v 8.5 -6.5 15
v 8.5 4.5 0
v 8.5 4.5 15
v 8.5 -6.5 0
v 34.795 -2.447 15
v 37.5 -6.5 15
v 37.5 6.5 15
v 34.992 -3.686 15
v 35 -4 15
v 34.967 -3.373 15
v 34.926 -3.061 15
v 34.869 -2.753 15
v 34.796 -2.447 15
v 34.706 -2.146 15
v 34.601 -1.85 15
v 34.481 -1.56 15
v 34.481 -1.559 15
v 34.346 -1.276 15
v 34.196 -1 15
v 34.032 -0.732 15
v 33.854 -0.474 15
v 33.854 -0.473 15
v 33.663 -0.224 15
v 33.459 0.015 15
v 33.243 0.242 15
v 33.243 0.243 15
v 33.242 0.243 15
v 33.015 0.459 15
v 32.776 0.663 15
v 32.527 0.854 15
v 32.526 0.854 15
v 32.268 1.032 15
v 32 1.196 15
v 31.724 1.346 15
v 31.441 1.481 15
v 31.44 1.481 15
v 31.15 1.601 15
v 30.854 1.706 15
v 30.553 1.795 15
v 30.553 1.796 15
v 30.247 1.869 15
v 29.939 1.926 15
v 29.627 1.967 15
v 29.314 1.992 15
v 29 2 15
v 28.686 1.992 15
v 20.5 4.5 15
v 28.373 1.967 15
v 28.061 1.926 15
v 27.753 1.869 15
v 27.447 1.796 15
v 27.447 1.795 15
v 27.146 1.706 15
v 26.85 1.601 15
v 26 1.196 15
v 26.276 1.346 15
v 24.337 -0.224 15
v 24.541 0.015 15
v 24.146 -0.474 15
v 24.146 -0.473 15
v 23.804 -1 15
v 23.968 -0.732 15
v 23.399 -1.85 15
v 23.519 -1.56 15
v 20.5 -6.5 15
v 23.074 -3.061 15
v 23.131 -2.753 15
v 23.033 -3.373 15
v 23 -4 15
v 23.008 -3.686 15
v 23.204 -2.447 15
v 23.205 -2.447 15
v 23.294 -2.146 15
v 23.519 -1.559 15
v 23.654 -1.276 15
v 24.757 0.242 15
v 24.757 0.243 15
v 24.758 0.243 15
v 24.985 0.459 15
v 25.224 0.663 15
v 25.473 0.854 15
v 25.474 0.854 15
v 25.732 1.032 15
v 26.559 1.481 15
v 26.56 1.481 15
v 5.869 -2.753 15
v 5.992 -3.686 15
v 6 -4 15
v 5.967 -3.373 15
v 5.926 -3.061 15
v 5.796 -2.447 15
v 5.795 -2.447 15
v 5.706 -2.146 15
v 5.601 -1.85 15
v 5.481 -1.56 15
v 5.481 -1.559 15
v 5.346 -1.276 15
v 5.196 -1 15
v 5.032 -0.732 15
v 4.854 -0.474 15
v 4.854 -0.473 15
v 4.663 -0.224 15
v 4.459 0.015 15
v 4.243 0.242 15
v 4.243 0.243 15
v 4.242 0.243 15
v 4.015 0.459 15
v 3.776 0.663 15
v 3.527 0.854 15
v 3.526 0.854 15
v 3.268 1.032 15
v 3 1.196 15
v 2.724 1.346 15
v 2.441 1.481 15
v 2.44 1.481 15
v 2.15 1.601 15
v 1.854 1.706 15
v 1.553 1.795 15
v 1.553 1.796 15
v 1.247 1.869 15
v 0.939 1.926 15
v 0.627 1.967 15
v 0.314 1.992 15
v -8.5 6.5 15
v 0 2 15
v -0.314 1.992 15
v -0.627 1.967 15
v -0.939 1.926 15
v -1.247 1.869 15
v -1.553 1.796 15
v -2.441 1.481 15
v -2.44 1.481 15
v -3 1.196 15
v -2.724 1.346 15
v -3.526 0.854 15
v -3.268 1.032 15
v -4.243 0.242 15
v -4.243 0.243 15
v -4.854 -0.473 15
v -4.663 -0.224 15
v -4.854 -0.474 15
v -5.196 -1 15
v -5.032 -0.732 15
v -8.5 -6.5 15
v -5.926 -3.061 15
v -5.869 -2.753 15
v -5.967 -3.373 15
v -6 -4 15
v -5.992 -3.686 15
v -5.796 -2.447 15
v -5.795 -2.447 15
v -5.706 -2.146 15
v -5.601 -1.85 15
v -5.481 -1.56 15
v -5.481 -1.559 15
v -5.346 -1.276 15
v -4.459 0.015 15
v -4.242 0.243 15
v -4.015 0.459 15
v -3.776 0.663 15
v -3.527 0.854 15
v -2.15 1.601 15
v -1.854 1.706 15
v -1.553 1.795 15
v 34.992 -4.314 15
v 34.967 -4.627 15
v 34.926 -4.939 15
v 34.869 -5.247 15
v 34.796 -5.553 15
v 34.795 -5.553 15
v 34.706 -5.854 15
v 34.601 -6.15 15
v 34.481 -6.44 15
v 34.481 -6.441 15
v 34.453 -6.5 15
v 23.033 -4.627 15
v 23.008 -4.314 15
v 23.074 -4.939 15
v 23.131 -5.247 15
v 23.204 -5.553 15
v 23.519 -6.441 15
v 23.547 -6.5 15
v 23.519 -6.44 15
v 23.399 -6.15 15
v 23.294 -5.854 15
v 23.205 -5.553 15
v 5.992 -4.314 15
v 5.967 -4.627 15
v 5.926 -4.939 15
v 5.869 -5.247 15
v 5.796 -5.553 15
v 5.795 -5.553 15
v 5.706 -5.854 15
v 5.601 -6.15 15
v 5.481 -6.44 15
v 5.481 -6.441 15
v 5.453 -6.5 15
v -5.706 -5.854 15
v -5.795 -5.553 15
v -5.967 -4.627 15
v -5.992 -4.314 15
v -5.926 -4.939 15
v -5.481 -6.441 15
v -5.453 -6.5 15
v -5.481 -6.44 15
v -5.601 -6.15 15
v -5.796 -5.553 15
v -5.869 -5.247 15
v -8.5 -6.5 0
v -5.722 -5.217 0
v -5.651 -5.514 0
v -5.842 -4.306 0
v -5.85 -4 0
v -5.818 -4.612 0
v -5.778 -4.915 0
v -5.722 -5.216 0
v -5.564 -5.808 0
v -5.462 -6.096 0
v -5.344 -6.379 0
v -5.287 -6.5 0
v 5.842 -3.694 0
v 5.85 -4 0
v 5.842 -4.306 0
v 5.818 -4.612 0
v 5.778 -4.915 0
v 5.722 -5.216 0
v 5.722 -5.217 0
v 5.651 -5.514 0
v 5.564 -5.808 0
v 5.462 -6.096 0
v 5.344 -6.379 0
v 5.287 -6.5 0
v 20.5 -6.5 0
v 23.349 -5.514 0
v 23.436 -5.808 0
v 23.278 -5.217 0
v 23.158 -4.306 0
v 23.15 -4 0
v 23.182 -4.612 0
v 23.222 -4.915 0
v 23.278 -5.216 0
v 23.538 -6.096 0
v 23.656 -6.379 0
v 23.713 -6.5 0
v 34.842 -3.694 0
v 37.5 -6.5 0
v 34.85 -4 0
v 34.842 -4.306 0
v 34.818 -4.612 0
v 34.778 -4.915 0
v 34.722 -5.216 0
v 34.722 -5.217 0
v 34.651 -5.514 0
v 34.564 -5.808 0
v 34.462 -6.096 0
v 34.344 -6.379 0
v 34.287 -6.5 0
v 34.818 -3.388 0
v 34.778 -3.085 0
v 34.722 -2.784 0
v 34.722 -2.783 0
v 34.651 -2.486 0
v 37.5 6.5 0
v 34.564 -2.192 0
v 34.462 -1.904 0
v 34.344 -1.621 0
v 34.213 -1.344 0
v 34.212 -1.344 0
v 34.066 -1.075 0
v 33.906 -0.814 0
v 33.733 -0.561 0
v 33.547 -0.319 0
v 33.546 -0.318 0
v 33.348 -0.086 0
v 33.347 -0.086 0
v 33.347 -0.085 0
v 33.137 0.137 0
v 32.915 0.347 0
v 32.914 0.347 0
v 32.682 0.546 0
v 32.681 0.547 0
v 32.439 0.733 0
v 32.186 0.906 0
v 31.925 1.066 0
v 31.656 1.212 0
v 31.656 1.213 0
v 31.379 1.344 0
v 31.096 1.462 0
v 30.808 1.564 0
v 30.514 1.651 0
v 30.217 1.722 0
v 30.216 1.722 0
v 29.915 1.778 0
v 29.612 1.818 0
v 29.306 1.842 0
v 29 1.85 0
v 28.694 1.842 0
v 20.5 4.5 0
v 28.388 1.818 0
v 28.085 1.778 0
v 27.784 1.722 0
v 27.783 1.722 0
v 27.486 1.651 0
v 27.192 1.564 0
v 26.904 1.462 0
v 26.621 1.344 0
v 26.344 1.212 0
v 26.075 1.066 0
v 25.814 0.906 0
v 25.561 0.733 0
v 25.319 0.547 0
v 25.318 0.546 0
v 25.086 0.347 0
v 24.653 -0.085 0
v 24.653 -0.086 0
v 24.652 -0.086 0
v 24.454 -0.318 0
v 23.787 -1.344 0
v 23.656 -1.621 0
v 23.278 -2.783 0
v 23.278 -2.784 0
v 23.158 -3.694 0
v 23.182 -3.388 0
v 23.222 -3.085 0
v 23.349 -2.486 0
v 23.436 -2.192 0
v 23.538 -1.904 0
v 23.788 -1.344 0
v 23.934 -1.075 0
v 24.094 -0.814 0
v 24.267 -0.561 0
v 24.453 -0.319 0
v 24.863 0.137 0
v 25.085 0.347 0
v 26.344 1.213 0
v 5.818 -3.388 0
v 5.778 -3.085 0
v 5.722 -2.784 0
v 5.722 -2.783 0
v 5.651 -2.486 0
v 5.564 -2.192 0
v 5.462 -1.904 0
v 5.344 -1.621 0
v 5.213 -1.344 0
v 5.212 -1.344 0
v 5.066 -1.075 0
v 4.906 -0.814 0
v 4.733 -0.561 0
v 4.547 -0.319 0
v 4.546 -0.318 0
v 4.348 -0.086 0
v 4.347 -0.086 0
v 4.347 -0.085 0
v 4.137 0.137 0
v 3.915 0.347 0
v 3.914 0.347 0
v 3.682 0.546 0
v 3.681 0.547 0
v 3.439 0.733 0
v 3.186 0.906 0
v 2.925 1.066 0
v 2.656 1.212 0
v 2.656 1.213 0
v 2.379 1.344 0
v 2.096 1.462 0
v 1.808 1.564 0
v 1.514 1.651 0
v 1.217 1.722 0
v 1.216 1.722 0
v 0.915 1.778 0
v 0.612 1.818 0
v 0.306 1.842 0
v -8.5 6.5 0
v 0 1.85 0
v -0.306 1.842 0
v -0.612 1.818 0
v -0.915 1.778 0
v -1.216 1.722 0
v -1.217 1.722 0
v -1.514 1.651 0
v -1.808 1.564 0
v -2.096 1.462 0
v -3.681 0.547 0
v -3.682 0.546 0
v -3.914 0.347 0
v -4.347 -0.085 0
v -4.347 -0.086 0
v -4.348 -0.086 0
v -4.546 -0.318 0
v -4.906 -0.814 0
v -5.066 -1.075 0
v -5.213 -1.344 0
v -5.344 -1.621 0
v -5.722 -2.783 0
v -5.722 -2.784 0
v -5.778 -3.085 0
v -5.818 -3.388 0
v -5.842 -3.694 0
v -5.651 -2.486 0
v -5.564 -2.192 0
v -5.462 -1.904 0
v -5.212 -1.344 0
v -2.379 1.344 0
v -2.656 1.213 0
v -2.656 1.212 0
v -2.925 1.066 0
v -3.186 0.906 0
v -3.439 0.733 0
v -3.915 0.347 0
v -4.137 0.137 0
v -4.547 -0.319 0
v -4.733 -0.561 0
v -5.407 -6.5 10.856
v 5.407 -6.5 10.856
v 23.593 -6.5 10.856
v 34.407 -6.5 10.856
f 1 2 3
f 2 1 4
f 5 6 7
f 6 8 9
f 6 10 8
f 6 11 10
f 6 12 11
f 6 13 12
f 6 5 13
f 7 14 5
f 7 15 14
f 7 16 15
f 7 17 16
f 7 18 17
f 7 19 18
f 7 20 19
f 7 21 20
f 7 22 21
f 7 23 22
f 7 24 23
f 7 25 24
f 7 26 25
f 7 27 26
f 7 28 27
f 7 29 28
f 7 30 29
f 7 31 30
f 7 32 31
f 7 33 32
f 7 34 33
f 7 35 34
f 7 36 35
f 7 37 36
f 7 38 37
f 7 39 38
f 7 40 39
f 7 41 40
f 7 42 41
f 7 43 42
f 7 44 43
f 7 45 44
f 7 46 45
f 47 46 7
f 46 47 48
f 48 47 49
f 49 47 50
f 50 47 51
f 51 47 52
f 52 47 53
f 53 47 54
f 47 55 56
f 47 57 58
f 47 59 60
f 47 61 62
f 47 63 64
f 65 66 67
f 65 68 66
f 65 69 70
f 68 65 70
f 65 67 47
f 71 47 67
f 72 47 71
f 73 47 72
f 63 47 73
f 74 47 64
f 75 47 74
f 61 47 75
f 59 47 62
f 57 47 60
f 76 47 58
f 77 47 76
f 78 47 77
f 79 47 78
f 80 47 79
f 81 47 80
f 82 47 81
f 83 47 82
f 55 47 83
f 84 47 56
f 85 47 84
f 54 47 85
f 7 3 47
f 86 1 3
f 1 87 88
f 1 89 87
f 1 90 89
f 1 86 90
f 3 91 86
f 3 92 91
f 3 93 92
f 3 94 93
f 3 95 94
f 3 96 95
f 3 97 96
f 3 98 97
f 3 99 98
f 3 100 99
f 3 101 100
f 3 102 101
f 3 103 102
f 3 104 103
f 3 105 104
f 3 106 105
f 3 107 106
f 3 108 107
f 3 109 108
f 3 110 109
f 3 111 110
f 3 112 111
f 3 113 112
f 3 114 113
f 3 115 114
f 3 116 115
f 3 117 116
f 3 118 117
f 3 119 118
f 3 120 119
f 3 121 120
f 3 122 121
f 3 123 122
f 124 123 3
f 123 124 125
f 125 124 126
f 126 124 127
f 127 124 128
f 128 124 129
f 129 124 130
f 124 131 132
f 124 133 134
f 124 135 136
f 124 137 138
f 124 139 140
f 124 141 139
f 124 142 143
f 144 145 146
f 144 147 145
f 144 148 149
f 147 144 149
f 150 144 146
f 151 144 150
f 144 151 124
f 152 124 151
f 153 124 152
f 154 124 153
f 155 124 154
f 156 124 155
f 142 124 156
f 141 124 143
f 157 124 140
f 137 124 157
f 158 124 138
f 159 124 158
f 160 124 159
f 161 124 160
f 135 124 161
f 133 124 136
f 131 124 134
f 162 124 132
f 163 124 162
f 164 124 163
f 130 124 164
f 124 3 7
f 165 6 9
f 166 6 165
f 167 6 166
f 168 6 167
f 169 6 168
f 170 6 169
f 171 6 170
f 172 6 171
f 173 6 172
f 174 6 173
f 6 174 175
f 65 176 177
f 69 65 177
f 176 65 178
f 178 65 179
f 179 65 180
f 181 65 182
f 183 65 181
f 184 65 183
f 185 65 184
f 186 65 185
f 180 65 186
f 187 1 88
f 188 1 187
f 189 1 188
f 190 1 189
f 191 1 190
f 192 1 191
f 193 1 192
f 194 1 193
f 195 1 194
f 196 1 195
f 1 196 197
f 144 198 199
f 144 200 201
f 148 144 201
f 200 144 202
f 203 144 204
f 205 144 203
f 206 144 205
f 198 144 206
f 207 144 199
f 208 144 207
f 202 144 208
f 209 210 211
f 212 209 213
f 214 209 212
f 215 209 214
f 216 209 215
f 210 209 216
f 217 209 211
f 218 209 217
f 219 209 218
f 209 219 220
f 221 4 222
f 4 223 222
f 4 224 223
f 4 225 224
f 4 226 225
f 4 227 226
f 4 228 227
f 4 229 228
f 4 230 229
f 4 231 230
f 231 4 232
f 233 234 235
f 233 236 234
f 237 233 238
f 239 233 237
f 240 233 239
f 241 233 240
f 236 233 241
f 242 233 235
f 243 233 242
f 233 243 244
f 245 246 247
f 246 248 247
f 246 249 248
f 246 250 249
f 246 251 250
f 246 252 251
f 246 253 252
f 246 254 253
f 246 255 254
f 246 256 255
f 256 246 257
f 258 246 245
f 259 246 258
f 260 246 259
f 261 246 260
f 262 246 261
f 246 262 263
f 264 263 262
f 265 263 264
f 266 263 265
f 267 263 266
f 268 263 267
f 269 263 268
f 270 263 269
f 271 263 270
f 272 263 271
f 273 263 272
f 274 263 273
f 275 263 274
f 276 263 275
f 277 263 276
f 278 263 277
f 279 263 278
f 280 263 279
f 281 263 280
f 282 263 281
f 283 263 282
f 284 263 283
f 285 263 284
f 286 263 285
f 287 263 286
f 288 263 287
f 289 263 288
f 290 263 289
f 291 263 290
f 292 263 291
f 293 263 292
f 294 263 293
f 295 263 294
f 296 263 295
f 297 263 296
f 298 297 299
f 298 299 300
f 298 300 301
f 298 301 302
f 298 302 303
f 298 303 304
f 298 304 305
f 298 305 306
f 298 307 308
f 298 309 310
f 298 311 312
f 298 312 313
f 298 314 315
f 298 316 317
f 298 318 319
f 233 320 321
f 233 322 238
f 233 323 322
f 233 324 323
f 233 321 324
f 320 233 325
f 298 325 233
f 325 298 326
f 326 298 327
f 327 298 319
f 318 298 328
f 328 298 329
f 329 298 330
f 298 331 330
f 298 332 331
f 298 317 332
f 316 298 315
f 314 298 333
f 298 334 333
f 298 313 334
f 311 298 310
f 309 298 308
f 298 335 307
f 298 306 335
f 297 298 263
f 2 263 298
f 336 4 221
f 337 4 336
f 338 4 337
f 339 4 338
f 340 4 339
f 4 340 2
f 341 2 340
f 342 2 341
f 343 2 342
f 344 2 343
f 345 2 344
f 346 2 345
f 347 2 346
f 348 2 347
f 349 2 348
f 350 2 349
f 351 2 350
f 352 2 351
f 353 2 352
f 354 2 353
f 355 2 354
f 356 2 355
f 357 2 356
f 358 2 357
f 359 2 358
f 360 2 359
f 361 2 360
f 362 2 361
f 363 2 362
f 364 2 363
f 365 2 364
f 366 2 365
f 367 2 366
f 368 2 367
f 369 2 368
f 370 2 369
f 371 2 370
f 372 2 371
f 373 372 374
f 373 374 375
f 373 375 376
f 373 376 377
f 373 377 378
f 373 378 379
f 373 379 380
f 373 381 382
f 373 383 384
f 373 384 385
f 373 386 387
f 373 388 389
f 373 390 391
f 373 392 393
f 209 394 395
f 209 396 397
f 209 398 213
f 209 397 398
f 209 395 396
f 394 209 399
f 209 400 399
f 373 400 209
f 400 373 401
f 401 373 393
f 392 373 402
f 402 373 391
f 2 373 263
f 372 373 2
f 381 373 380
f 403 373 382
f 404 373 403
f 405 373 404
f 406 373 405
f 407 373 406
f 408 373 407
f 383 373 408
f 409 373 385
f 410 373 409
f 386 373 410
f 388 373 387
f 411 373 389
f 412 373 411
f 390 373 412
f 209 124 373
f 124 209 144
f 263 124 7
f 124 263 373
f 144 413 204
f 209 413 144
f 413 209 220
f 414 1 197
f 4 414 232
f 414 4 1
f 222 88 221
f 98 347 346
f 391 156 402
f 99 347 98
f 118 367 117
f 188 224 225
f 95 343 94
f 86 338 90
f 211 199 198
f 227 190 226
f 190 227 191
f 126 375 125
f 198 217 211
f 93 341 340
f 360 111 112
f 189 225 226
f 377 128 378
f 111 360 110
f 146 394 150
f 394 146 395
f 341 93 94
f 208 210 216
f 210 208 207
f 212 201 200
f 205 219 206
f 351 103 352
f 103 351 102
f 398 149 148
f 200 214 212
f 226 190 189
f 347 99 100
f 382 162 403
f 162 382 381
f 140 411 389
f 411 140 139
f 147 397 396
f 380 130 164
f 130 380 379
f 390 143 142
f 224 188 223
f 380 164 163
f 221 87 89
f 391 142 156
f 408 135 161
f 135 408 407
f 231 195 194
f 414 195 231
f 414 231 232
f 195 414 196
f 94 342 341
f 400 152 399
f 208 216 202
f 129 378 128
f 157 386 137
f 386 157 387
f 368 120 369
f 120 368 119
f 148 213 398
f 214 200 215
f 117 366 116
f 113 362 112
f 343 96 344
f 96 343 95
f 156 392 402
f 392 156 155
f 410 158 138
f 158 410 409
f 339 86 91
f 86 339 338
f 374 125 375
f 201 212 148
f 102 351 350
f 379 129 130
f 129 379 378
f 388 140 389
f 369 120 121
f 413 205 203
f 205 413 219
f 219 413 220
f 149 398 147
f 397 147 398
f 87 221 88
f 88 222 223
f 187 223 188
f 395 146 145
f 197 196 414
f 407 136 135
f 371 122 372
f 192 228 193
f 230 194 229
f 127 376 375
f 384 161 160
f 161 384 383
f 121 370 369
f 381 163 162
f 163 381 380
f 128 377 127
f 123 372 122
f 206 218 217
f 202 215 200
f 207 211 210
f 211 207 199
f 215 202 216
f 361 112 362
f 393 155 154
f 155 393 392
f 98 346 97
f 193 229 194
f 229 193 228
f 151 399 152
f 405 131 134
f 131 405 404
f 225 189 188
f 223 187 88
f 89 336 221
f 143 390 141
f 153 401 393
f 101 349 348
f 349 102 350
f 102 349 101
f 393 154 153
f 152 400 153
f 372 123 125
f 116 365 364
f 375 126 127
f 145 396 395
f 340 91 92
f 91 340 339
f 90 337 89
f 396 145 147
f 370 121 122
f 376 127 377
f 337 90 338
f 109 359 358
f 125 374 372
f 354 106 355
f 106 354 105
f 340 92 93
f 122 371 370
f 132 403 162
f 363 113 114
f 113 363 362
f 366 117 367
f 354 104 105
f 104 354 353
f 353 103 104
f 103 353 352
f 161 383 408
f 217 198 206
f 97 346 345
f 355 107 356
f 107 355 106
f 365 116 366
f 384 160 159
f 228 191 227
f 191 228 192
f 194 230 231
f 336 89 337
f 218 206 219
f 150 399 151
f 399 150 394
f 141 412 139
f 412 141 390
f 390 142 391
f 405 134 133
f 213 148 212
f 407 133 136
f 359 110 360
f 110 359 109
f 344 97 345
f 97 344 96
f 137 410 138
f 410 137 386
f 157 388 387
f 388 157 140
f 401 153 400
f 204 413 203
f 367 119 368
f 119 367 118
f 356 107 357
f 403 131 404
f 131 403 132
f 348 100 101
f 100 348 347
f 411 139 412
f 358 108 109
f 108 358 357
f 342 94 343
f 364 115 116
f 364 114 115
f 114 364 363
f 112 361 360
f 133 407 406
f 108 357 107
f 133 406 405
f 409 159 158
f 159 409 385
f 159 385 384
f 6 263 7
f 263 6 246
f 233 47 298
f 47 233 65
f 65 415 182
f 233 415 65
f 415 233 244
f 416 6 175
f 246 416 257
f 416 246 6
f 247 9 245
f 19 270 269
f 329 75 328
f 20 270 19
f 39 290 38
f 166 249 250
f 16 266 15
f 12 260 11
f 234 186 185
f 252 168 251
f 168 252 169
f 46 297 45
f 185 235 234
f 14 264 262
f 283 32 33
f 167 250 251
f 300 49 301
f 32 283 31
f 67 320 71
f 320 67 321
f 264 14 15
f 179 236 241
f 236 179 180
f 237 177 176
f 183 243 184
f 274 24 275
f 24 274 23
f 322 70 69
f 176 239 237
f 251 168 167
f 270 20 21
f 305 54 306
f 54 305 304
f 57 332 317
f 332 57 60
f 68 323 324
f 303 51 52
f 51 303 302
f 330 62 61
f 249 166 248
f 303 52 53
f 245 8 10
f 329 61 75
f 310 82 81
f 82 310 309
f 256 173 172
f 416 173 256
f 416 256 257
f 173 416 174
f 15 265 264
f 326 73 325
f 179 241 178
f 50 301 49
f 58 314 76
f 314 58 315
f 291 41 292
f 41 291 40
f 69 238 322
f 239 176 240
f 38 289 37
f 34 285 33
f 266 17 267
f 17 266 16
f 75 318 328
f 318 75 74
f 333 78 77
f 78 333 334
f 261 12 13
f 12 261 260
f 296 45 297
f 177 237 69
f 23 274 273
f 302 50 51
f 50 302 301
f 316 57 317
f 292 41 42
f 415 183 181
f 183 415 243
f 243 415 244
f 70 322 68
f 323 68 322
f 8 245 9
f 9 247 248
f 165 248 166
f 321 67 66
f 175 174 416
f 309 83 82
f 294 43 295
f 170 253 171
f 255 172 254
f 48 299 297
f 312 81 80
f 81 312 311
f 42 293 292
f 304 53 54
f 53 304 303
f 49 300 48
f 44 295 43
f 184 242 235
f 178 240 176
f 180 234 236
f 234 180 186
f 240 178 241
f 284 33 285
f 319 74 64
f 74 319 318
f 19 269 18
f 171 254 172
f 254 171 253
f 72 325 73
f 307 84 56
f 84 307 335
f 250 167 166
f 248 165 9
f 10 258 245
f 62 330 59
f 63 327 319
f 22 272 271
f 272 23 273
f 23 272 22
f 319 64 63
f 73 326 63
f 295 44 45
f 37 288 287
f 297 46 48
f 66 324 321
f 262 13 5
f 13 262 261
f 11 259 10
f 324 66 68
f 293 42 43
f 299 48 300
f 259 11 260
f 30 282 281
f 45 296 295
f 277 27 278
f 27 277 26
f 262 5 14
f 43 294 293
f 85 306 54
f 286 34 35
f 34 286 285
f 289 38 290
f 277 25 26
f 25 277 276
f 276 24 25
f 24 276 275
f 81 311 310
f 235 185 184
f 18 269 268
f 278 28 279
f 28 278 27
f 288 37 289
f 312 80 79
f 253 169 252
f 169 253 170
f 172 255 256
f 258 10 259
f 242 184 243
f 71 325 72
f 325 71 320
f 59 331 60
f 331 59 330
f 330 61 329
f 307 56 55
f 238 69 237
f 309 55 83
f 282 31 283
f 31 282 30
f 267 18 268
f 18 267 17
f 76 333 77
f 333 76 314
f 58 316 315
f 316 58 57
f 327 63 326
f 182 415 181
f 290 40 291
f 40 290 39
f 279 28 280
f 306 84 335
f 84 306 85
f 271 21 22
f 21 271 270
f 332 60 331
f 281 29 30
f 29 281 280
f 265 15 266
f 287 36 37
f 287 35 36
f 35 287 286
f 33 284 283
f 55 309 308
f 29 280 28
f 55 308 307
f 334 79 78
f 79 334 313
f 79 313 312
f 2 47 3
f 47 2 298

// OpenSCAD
sharpie_max_diam = 12;
sharpie_min_diam = 11.7;
clip_width = 17;
clip_depth = 13;
clip_height = 15;

$fn = 120;

module clip() {
    difference() {
        translate([-clip_width/2, -clip_depth/2, 0]) cube([clip_width, clip_depth, clip_height]);

        translate([0,-sharpie_max_diam/3,-.01]) cylinder(h = clip_height+.02, d1 = sharpie_min_diam, d2 = sharpie_max_diam);
    }
}

clip_spacing = 12;

clip();
translate([clip_width + clip_spacing, 0, 0]) clip();

translate([-clip_width/2,clip_depth/2,0]) rotate([90,0,0]) cube([clip_width*2+clip_spacing, clip_height, 2]);
